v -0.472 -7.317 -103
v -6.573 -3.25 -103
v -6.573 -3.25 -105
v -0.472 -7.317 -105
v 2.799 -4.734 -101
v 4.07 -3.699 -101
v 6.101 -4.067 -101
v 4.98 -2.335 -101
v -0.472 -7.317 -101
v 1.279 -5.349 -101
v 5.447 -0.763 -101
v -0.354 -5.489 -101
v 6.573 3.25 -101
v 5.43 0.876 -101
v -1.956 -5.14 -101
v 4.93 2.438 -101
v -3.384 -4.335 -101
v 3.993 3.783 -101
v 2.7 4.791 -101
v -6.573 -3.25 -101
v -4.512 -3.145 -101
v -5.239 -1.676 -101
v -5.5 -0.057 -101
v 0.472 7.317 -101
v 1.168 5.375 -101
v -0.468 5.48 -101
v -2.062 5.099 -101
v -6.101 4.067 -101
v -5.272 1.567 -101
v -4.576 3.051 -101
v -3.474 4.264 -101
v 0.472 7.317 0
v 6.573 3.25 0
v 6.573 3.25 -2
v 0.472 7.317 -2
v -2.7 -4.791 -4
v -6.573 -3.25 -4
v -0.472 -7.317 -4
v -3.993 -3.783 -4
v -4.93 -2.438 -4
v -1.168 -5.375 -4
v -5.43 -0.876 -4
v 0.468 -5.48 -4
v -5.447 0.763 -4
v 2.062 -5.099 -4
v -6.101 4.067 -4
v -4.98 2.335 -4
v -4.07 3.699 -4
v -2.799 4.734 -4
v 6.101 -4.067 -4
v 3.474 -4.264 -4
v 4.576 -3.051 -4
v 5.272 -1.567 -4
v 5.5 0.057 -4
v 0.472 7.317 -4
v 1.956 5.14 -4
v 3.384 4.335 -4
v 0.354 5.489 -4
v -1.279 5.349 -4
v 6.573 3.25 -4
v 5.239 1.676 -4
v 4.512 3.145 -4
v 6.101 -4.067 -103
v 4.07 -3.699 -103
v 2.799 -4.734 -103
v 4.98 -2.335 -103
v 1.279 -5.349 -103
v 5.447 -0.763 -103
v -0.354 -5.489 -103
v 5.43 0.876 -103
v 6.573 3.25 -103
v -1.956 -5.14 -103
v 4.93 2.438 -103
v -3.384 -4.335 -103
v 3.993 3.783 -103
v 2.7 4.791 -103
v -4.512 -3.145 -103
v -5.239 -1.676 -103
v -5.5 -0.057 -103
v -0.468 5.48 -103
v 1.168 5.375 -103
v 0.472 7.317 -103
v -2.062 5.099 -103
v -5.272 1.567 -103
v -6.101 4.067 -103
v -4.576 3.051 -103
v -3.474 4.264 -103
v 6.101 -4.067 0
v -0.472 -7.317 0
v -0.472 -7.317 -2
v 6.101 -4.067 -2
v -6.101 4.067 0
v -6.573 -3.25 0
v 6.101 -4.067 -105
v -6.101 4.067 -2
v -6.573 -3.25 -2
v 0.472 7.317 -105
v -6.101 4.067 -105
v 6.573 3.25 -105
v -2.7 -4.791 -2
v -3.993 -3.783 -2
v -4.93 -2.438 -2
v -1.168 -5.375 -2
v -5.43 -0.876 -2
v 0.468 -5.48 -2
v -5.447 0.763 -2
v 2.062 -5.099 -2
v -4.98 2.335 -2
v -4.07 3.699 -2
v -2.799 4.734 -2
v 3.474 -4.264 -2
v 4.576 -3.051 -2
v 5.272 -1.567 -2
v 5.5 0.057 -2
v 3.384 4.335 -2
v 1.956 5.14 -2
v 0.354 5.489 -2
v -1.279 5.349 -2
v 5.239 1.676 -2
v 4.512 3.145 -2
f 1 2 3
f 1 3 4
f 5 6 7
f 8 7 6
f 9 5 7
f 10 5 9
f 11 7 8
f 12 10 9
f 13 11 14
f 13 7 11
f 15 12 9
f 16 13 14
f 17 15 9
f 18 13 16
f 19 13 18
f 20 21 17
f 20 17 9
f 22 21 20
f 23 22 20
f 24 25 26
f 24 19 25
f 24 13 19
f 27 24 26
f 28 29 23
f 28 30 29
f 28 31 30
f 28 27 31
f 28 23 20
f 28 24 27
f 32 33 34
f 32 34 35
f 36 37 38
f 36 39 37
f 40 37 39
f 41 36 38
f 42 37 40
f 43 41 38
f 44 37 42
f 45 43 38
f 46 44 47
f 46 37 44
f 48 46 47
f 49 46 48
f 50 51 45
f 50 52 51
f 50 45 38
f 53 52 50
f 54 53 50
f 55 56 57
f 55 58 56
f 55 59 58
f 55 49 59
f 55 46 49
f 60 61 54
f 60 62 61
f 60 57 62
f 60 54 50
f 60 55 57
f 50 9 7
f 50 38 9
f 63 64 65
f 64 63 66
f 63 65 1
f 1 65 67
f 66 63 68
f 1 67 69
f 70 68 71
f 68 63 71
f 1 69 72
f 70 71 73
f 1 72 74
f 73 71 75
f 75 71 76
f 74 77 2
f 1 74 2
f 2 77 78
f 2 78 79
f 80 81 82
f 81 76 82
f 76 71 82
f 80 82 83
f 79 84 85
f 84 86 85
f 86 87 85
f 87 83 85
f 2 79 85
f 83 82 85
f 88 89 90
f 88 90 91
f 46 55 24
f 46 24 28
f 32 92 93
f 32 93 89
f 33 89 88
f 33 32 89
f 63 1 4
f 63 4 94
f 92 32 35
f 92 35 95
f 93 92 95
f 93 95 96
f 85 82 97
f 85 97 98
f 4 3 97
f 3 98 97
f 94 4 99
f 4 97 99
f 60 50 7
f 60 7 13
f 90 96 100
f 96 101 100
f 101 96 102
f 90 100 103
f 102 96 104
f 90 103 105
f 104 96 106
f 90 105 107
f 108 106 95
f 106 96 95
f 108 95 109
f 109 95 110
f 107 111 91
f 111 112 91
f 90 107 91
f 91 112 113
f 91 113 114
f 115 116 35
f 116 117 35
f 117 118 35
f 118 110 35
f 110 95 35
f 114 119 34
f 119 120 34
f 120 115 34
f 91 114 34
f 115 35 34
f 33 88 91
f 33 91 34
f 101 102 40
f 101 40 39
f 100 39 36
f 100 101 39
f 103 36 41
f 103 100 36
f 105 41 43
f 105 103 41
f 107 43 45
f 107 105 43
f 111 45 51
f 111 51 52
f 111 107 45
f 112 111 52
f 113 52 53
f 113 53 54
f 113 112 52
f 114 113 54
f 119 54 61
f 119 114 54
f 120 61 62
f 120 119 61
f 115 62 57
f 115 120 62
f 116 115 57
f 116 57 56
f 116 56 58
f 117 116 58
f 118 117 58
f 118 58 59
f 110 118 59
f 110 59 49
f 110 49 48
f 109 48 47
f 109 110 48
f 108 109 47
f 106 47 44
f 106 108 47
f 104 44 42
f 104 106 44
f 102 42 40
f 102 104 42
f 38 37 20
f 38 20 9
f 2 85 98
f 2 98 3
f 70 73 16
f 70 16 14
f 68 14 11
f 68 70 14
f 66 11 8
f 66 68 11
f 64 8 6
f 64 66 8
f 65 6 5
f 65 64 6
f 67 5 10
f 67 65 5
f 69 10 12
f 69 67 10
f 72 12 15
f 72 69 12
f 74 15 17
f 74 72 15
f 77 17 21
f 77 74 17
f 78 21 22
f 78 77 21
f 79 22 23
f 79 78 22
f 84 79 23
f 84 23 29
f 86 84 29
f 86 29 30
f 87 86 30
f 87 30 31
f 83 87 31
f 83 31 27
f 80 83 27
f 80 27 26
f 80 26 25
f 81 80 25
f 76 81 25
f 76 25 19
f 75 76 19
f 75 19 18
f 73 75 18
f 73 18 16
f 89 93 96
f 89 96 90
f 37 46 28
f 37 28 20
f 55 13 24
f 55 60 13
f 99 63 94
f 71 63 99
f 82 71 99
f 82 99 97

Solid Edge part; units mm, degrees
sketch "Sketch1" plane through (0, 0, 0) normal (0, 0, 1) x (1, 0, 0)
  line L0 (-6.1009, 4.0673) -> (-6.5728, -3.2499)
  line L1 (-6.5728, -3.2499) -> (-0.4719, -7.3171)
  line L2 (-0.4719, -7.3171) -> (6.1009, -4.0673)
  line L3 (6.1009, -4.0673) -> (6.5728, 3.2499)
  line L4 (6.5728, 3.2499) -> (0.4719, 7.3171)
  line L5 (0.4719, 7.3171) -> (-6.1009, 4.0673)
extrude "Protrusion1" add sketch "Sketch1" against normal blind 105
sketch "Sketch2" plane through (0, 0, -2) normal (0, 0, 1) x (-0.8964, -0.4432, 0)
  circle A0 centre (0, 0) radius 5.5
  circle A1 centre (0, 0) radius 13.1424
extrude "ExtrudedCutout_1" cut sketch "Sketch2" against normal blind 2
sketch "Sketch3" plane through (0, 0, -103) normal (0, 0, -1) x (0.8964, 0.4432, 0)
  circle A0 centre (0, 0) radius 5.5
  circle A1 centre (0, 0) radius 13.1424
extrude "ExtrudedCutout_2" cut sketch "Sketch3" against normal blind 2
properties part number "BumbleB0505"
